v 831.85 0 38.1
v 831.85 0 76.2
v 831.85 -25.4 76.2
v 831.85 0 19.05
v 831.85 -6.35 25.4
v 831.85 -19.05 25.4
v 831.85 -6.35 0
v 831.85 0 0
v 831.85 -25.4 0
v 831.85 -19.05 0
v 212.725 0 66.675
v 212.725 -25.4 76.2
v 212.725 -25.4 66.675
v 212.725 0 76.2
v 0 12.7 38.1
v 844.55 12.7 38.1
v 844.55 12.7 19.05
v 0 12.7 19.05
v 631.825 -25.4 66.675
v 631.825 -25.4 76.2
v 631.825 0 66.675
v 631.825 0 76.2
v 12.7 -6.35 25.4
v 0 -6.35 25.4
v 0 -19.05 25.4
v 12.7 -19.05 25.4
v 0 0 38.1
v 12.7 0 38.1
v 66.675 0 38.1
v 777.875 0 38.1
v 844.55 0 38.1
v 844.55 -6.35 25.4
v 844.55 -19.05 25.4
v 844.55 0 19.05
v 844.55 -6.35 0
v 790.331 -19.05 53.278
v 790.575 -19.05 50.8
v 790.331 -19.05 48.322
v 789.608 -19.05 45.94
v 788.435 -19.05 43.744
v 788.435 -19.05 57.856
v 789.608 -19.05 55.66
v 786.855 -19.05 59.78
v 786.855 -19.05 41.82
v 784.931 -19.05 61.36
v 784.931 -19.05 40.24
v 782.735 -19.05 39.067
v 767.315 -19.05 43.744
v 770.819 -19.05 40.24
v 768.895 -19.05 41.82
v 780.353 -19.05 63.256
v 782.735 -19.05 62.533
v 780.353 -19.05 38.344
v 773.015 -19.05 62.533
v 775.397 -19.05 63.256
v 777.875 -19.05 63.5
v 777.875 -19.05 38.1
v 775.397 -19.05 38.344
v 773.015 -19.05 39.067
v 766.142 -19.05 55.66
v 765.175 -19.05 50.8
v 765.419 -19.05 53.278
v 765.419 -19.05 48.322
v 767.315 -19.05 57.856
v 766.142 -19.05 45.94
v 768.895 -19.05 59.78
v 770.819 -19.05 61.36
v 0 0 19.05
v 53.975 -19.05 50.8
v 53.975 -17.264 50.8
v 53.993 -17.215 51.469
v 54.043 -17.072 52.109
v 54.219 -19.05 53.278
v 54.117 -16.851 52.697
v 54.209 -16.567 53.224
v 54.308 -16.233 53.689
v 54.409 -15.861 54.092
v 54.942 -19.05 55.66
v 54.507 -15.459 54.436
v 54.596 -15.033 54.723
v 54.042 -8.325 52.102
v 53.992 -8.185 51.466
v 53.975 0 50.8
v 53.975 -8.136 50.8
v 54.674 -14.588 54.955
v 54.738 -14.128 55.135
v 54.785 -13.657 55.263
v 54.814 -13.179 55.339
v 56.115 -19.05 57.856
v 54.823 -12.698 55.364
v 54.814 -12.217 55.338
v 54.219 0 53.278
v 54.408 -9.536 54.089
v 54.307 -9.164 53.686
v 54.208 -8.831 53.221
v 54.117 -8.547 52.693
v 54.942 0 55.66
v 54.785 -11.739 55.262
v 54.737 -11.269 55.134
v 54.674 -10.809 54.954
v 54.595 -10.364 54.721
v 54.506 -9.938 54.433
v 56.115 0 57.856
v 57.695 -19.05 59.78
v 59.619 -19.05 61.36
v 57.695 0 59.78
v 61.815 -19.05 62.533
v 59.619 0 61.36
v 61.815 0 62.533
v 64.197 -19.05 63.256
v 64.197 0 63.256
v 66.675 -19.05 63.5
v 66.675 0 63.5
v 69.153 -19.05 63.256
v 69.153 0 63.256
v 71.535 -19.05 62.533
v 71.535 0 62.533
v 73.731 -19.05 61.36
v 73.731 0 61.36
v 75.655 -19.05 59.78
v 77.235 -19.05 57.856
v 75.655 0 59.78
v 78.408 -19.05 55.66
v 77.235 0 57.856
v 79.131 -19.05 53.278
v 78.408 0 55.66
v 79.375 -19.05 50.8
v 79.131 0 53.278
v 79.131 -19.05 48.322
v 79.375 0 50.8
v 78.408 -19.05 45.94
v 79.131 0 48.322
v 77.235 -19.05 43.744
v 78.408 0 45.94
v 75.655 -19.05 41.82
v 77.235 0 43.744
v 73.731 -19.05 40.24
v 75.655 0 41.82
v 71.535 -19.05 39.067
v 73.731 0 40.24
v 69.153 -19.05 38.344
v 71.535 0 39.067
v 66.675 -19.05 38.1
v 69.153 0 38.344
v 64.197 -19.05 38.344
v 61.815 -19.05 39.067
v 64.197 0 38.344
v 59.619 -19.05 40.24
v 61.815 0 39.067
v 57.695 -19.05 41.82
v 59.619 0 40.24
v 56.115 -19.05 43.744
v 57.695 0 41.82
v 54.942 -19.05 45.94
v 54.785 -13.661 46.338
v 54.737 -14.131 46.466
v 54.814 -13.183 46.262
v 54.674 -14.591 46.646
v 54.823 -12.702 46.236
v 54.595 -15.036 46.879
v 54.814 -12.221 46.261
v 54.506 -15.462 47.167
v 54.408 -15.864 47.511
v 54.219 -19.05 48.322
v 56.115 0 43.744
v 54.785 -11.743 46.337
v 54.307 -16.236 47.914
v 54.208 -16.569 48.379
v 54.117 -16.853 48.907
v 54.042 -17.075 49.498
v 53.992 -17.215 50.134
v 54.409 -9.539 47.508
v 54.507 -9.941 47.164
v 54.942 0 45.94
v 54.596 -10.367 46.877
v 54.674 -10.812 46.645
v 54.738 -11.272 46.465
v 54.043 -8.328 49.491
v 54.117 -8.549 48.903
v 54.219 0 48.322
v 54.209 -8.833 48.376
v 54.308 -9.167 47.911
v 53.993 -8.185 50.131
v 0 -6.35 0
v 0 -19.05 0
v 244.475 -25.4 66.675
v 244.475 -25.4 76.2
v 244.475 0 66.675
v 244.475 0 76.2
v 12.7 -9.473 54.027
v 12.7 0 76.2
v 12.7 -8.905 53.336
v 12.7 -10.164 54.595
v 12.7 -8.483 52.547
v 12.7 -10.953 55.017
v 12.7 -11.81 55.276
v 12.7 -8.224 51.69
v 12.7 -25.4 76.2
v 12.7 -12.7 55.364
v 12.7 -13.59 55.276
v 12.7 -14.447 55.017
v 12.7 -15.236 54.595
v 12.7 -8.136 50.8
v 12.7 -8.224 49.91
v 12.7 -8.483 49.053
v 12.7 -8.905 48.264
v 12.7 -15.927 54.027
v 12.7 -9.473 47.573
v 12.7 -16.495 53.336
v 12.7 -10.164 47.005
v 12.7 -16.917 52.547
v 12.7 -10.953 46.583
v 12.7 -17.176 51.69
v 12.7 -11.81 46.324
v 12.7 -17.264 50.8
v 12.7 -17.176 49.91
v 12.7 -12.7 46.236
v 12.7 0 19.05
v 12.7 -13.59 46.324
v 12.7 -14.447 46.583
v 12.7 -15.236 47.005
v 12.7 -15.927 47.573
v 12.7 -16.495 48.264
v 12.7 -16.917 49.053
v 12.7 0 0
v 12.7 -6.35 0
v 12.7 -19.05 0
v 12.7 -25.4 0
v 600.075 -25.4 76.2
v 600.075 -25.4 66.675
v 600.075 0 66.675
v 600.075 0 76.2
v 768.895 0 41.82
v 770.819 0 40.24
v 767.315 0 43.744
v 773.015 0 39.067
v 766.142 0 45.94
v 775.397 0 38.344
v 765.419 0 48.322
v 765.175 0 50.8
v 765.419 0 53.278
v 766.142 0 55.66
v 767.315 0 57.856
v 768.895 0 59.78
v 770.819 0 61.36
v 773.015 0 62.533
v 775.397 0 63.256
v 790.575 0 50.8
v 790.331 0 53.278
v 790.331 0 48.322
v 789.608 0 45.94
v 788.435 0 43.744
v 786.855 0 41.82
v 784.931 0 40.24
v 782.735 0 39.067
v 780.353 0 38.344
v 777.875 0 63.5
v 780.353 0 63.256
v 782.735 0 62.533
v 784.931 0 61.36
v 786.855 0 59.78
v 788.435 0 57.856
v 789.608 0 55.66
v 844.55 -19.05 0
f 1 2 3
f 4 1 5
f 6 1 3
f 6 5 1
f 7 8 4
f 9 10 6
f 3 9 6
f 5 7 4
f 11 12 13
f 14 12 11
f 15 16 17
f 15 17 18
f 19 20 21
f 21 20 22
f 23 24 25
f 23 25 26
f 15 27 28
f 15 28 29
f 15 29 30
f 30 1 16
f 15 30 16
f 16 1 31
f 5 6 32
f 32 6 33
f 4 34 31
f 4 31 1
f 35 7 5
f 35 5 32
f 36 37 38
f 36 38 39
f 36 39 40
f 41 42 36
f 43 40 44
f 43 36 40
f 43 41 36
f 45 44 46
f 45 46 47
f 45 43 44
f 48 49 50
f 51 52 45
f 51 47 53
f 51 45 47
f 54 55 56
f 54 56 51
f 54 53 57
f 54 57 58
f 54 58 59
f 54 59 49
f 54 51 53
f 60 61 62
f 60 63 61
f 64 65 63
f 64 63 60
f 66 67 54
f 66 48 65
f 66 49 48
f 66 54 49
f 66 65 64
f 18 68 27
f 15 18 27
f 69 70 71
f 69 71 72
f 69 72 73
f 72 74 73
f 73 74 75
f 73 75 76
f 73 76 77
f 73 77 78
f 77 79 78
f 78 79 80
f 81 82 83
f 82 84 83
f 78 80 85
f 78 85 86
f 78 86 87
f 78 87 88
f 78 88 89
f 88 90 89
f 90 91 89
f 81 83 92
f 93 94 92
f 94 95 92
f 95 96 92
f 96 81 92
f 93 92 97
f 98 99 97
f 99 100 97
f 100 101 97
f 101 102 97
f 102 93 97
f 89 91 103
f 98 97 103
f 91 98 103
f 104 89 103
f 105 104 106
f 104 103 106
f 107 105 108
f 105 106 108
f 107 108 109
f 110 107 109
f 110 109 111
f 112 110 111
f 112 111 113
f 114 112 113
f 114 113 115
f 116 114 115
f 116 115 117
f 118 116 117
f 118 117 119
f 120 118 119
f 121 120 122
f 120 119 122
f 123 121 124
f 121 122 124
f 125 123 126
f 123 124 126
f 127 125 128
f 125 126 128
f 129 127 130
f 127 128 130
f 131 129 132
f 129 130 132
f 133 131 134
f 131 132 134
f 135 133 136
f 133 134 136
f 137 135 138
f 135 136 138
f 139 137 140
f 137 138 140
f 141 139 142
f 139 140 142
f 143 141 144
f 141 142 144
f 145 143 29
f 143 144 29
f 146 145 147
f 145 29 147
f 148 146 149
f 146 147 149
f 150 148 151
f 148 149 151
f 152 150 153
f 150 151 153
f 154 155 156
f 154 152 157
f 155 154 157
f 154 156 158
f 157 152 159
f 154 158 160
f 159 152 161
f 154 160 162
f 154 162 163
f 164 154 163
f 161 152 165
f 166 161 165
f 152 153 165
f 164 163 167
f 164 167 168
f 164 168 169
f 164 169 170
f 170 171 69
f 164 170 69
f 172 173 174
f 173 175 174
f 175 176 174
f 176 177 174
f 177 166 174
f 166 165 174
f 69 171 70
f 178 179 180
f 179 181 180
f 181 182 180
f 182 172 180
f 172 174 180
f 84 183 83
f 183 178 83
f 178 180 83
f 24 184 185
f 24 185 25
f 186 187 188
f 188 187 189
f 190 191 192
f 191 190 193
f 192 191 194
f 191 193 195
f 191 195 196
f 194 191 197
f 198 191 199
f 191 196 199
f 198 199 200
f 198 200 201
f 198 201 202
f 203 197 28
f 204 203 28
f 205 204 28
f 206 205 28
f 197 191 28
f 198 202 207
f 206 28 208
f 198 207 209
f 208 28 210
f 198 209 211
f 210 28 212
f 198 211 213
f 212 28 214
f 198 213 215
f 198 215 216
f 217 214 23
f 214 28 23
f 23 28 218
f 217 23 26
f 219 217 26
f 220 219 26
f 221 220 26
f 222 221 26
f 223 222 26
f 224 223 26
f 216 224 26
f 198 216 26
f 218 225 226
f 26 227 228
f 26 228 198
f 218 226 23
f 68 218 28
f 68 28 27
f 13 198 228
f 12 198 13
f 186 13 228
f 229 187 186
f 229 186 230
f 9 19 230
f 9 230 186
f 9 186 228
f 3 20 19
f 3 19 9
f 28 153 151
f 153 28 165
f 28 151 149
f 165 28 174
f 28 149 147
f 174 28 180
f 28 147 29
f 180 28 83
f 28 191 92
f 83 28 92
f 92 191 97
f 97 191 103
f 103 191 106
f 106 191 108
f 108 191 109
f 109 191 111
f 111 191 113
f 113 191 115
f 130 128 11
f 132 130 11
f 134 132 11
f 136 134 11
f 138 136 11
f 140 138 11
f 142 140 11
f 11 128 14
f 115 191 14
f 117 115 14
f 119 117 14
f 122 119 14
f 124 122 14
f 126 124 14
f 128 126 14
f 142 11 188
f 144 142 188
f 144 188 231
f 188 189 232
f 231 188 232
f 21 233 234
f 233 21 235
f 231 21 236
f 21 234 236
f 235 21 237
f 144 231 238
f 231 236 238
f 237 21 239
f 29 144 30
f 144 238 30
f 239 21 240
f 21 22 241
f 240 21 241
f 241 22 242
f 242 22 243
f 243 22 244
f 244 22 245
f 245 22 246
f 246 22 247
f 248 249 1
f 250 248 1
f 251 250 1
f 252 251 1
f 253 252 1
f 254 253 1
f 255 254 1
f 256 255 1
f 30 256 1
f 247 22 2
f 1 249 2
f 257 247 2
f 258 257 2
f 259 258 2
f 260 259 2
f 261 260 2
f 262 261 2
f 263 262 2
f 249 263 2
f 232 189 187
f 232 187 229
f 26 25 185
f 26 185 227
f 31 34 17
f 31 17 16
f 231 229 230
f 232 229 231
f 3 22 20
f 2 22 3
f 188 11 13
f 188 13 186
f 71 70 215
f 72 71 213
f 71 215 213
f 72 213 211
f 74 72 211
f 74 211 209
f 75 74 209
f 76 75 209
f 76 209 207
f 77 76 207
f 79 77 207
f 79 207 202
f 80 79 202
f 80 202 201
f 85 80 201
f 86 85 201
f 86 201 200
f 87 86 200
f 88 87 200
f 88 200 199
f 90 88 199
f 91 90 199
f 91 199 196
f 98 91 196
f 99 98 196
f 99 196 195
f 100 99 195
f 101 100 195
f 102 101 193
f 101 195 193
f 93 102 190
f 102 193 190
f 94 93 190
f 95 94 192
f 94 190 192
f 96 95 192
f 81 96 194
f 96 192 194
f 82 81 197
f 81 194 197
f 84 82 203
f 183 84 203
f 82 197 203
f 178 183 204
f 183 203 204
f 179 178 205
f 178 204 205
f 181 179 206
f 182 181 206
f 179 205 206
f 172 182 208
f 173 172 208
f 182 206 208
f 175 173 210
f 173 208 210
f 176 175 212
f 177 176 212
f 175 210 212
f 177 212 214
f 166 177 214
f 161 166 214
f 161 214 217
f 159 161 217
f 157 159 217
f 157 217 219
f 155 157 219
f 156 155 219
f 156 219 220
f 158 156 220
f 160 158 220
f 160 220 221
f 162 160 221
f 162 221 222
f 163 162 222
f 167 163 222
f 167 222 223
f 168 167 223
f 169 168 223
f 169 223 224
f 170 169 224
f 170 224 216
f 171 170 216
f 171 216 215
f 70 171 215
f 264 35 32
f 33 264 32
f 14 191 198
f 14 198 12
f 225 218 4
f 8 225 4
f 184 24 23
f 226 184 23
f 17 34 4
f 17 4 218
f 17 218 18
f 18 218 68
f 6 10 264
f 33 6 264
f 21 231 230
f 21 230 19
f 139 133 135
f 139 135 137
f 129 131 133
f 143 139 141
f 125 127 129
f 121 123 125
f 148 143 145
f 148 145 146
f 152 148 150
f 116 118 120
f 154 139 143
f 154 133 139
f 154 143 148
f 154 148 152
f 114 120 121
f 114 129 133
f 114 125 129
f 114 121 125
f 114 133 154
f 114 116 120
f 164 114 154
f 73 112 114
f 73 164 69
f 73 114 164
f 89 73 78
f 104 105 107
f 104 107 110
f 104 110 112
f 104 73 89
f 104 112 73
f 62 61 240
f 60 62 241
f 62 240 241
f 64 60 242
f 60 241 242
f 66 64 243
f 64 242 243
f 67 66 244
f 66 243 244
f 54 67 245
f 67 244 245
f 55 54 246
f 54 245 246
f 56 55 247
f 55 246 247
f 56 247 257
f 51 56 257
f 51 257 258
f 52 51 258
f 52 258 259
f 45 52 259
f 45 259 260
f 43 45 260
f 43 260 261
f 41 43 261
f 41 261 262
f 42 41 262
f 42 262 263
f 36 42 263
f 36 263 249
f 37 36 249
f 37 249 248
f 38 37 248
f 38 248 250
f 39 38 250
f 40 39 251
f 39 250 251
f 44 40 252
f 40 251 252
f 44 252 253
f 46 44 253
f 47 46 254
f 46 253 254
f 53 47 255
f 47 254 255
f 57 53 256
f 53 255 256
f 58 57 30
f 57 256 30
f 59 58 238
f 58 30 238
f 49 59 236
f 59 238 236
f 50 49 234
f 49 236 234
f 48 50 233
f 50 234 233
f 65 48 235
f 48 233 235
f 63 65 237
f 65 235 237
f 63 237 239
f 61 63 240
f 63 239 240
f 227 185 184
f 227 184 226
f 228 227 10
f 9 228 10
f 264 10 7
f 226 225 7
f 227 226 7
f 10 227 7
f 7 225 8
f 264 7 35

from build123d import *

# Parameters (mm, degrees)
F0_W      = 844.55
F0_H      = 76.2
F1_DEPTH  = 25.4
F2_W      = 12.7
F2_H      = 50.8
F3_DEPTH  = 25.401
F4_W      = 12.7
F4_H      = 6.35
F5_DEPTH  = 76.201
F6_R      = 4.564063
F7_DEPTH  = 50.8
F8_R      = 12.7
F9_DEPTH  = 19.05
F10_W     = 12.7
F10_H     = 19.05
F11_DEPTH = 12.7
F12_W     = 31.75
F12_H     = 25.4
F13_DEPTH = 9.525


with BuildPart() as f1:
    # F0 (on Front) → F1 (new body)
    with BuildSketch(Plane.XZ):
        with Locations((422.275, 38.1)):
            Rectangle(F0_W, F0_H)
    extrude(amount=F1_DEPTH)

    # F2 (on face) → F3 (cut, through all)
    with BuildSketch(Plane.XZ.offset(25.4)):
        with Locations((6.35, 50.8)):
            Rectangle(F2_W, F2_H)
        with Locations((838.2, 50.8)):
            Rectangle(F2_W, F2_H)
    extrude(amount=-F3_DEPTH, mode=Mode.SUBTRACT)

    # F4 (on face) → F5 (cut, through all)
    with BuildSketch(Plane(origin=(0, 0, 0), x_dir=(1, 0, 0), z_dir=(0, 0, -1))):
        with Locations((838.2, 22.225)):
            Rectangle(F4_W, F4_H)
        with Locations((838.2, 3.175)):
            Rectangle(F4_W, F4_H)
        with Locations((6.35, 22.225)):
            Rectangle(F4_W, F4_H)
        with Locations((6.35, 3.175)):
            Rectangle(F4_W, F4_H)
    extrude(amount=-F5_DEPTH, mode=Mode.SUBTRACT)

    # F6 (on face) → F7 (cut)
    with BuildSketch(Plane(origin=(12.7, 0, 0), x_dir=(0, -1, 0), z_dir=(-1, 0, 0))):
        with Locations((12.7, 50.8)):
            Circle(F6_R)
    extrude(amount=-F7_DEPTH, mode=Mode.SUBTRACT)

    # F8 (on face) → F9 (cut)
    with BuildSketch(Plane(origin=(0, 0, 0), x_dir=(-1, 0, 0), z_dir=(0, 1, 0))):
        with Locations((-66.675, 50.8)):
            Circle(F8_R)
        with Locations((-777.875, 50.8)):
            Circle(F8_R)
    extrude(amount=-F9_DEPTH, mode=Mode.SUBTRACT)

    # F10 (on face) → F11 (join)
    with BuildSketch(Plane(origin=(0, 0, 0), x_dir=(-1, 0, 0), z_dir=(0, 1, 0))):
        Polygon((-777.875, 38.1), (-831.85, 38.1), (-831.85, 19.05), (-12.7, 19.05), (-12.7, 38.1), (-66.675, 38.1), align=None)
        with Locations((-838.2, 28.575)):
            Rectangle(F10_W, F10_H)
        with Locations((-6.35, 28.575)):
            Rectangle(F10_W, F10_H)
    extrude(amount=F11_DEPTH)

    # F12 (on face) → F13 (cut)
    with BuildSketch(Plane.XY.offset(76.2)):
        with Locations((228.6, -12.7)):
            Rectangle(F12_W, F12_H)
        with Locations((615.95, -12.7)):
            Rectangle(F12_W, F12_H)
    extrude(amount=-F13_DEPTH, mode=Mode.SUBTRACT)


solid = f1.part
